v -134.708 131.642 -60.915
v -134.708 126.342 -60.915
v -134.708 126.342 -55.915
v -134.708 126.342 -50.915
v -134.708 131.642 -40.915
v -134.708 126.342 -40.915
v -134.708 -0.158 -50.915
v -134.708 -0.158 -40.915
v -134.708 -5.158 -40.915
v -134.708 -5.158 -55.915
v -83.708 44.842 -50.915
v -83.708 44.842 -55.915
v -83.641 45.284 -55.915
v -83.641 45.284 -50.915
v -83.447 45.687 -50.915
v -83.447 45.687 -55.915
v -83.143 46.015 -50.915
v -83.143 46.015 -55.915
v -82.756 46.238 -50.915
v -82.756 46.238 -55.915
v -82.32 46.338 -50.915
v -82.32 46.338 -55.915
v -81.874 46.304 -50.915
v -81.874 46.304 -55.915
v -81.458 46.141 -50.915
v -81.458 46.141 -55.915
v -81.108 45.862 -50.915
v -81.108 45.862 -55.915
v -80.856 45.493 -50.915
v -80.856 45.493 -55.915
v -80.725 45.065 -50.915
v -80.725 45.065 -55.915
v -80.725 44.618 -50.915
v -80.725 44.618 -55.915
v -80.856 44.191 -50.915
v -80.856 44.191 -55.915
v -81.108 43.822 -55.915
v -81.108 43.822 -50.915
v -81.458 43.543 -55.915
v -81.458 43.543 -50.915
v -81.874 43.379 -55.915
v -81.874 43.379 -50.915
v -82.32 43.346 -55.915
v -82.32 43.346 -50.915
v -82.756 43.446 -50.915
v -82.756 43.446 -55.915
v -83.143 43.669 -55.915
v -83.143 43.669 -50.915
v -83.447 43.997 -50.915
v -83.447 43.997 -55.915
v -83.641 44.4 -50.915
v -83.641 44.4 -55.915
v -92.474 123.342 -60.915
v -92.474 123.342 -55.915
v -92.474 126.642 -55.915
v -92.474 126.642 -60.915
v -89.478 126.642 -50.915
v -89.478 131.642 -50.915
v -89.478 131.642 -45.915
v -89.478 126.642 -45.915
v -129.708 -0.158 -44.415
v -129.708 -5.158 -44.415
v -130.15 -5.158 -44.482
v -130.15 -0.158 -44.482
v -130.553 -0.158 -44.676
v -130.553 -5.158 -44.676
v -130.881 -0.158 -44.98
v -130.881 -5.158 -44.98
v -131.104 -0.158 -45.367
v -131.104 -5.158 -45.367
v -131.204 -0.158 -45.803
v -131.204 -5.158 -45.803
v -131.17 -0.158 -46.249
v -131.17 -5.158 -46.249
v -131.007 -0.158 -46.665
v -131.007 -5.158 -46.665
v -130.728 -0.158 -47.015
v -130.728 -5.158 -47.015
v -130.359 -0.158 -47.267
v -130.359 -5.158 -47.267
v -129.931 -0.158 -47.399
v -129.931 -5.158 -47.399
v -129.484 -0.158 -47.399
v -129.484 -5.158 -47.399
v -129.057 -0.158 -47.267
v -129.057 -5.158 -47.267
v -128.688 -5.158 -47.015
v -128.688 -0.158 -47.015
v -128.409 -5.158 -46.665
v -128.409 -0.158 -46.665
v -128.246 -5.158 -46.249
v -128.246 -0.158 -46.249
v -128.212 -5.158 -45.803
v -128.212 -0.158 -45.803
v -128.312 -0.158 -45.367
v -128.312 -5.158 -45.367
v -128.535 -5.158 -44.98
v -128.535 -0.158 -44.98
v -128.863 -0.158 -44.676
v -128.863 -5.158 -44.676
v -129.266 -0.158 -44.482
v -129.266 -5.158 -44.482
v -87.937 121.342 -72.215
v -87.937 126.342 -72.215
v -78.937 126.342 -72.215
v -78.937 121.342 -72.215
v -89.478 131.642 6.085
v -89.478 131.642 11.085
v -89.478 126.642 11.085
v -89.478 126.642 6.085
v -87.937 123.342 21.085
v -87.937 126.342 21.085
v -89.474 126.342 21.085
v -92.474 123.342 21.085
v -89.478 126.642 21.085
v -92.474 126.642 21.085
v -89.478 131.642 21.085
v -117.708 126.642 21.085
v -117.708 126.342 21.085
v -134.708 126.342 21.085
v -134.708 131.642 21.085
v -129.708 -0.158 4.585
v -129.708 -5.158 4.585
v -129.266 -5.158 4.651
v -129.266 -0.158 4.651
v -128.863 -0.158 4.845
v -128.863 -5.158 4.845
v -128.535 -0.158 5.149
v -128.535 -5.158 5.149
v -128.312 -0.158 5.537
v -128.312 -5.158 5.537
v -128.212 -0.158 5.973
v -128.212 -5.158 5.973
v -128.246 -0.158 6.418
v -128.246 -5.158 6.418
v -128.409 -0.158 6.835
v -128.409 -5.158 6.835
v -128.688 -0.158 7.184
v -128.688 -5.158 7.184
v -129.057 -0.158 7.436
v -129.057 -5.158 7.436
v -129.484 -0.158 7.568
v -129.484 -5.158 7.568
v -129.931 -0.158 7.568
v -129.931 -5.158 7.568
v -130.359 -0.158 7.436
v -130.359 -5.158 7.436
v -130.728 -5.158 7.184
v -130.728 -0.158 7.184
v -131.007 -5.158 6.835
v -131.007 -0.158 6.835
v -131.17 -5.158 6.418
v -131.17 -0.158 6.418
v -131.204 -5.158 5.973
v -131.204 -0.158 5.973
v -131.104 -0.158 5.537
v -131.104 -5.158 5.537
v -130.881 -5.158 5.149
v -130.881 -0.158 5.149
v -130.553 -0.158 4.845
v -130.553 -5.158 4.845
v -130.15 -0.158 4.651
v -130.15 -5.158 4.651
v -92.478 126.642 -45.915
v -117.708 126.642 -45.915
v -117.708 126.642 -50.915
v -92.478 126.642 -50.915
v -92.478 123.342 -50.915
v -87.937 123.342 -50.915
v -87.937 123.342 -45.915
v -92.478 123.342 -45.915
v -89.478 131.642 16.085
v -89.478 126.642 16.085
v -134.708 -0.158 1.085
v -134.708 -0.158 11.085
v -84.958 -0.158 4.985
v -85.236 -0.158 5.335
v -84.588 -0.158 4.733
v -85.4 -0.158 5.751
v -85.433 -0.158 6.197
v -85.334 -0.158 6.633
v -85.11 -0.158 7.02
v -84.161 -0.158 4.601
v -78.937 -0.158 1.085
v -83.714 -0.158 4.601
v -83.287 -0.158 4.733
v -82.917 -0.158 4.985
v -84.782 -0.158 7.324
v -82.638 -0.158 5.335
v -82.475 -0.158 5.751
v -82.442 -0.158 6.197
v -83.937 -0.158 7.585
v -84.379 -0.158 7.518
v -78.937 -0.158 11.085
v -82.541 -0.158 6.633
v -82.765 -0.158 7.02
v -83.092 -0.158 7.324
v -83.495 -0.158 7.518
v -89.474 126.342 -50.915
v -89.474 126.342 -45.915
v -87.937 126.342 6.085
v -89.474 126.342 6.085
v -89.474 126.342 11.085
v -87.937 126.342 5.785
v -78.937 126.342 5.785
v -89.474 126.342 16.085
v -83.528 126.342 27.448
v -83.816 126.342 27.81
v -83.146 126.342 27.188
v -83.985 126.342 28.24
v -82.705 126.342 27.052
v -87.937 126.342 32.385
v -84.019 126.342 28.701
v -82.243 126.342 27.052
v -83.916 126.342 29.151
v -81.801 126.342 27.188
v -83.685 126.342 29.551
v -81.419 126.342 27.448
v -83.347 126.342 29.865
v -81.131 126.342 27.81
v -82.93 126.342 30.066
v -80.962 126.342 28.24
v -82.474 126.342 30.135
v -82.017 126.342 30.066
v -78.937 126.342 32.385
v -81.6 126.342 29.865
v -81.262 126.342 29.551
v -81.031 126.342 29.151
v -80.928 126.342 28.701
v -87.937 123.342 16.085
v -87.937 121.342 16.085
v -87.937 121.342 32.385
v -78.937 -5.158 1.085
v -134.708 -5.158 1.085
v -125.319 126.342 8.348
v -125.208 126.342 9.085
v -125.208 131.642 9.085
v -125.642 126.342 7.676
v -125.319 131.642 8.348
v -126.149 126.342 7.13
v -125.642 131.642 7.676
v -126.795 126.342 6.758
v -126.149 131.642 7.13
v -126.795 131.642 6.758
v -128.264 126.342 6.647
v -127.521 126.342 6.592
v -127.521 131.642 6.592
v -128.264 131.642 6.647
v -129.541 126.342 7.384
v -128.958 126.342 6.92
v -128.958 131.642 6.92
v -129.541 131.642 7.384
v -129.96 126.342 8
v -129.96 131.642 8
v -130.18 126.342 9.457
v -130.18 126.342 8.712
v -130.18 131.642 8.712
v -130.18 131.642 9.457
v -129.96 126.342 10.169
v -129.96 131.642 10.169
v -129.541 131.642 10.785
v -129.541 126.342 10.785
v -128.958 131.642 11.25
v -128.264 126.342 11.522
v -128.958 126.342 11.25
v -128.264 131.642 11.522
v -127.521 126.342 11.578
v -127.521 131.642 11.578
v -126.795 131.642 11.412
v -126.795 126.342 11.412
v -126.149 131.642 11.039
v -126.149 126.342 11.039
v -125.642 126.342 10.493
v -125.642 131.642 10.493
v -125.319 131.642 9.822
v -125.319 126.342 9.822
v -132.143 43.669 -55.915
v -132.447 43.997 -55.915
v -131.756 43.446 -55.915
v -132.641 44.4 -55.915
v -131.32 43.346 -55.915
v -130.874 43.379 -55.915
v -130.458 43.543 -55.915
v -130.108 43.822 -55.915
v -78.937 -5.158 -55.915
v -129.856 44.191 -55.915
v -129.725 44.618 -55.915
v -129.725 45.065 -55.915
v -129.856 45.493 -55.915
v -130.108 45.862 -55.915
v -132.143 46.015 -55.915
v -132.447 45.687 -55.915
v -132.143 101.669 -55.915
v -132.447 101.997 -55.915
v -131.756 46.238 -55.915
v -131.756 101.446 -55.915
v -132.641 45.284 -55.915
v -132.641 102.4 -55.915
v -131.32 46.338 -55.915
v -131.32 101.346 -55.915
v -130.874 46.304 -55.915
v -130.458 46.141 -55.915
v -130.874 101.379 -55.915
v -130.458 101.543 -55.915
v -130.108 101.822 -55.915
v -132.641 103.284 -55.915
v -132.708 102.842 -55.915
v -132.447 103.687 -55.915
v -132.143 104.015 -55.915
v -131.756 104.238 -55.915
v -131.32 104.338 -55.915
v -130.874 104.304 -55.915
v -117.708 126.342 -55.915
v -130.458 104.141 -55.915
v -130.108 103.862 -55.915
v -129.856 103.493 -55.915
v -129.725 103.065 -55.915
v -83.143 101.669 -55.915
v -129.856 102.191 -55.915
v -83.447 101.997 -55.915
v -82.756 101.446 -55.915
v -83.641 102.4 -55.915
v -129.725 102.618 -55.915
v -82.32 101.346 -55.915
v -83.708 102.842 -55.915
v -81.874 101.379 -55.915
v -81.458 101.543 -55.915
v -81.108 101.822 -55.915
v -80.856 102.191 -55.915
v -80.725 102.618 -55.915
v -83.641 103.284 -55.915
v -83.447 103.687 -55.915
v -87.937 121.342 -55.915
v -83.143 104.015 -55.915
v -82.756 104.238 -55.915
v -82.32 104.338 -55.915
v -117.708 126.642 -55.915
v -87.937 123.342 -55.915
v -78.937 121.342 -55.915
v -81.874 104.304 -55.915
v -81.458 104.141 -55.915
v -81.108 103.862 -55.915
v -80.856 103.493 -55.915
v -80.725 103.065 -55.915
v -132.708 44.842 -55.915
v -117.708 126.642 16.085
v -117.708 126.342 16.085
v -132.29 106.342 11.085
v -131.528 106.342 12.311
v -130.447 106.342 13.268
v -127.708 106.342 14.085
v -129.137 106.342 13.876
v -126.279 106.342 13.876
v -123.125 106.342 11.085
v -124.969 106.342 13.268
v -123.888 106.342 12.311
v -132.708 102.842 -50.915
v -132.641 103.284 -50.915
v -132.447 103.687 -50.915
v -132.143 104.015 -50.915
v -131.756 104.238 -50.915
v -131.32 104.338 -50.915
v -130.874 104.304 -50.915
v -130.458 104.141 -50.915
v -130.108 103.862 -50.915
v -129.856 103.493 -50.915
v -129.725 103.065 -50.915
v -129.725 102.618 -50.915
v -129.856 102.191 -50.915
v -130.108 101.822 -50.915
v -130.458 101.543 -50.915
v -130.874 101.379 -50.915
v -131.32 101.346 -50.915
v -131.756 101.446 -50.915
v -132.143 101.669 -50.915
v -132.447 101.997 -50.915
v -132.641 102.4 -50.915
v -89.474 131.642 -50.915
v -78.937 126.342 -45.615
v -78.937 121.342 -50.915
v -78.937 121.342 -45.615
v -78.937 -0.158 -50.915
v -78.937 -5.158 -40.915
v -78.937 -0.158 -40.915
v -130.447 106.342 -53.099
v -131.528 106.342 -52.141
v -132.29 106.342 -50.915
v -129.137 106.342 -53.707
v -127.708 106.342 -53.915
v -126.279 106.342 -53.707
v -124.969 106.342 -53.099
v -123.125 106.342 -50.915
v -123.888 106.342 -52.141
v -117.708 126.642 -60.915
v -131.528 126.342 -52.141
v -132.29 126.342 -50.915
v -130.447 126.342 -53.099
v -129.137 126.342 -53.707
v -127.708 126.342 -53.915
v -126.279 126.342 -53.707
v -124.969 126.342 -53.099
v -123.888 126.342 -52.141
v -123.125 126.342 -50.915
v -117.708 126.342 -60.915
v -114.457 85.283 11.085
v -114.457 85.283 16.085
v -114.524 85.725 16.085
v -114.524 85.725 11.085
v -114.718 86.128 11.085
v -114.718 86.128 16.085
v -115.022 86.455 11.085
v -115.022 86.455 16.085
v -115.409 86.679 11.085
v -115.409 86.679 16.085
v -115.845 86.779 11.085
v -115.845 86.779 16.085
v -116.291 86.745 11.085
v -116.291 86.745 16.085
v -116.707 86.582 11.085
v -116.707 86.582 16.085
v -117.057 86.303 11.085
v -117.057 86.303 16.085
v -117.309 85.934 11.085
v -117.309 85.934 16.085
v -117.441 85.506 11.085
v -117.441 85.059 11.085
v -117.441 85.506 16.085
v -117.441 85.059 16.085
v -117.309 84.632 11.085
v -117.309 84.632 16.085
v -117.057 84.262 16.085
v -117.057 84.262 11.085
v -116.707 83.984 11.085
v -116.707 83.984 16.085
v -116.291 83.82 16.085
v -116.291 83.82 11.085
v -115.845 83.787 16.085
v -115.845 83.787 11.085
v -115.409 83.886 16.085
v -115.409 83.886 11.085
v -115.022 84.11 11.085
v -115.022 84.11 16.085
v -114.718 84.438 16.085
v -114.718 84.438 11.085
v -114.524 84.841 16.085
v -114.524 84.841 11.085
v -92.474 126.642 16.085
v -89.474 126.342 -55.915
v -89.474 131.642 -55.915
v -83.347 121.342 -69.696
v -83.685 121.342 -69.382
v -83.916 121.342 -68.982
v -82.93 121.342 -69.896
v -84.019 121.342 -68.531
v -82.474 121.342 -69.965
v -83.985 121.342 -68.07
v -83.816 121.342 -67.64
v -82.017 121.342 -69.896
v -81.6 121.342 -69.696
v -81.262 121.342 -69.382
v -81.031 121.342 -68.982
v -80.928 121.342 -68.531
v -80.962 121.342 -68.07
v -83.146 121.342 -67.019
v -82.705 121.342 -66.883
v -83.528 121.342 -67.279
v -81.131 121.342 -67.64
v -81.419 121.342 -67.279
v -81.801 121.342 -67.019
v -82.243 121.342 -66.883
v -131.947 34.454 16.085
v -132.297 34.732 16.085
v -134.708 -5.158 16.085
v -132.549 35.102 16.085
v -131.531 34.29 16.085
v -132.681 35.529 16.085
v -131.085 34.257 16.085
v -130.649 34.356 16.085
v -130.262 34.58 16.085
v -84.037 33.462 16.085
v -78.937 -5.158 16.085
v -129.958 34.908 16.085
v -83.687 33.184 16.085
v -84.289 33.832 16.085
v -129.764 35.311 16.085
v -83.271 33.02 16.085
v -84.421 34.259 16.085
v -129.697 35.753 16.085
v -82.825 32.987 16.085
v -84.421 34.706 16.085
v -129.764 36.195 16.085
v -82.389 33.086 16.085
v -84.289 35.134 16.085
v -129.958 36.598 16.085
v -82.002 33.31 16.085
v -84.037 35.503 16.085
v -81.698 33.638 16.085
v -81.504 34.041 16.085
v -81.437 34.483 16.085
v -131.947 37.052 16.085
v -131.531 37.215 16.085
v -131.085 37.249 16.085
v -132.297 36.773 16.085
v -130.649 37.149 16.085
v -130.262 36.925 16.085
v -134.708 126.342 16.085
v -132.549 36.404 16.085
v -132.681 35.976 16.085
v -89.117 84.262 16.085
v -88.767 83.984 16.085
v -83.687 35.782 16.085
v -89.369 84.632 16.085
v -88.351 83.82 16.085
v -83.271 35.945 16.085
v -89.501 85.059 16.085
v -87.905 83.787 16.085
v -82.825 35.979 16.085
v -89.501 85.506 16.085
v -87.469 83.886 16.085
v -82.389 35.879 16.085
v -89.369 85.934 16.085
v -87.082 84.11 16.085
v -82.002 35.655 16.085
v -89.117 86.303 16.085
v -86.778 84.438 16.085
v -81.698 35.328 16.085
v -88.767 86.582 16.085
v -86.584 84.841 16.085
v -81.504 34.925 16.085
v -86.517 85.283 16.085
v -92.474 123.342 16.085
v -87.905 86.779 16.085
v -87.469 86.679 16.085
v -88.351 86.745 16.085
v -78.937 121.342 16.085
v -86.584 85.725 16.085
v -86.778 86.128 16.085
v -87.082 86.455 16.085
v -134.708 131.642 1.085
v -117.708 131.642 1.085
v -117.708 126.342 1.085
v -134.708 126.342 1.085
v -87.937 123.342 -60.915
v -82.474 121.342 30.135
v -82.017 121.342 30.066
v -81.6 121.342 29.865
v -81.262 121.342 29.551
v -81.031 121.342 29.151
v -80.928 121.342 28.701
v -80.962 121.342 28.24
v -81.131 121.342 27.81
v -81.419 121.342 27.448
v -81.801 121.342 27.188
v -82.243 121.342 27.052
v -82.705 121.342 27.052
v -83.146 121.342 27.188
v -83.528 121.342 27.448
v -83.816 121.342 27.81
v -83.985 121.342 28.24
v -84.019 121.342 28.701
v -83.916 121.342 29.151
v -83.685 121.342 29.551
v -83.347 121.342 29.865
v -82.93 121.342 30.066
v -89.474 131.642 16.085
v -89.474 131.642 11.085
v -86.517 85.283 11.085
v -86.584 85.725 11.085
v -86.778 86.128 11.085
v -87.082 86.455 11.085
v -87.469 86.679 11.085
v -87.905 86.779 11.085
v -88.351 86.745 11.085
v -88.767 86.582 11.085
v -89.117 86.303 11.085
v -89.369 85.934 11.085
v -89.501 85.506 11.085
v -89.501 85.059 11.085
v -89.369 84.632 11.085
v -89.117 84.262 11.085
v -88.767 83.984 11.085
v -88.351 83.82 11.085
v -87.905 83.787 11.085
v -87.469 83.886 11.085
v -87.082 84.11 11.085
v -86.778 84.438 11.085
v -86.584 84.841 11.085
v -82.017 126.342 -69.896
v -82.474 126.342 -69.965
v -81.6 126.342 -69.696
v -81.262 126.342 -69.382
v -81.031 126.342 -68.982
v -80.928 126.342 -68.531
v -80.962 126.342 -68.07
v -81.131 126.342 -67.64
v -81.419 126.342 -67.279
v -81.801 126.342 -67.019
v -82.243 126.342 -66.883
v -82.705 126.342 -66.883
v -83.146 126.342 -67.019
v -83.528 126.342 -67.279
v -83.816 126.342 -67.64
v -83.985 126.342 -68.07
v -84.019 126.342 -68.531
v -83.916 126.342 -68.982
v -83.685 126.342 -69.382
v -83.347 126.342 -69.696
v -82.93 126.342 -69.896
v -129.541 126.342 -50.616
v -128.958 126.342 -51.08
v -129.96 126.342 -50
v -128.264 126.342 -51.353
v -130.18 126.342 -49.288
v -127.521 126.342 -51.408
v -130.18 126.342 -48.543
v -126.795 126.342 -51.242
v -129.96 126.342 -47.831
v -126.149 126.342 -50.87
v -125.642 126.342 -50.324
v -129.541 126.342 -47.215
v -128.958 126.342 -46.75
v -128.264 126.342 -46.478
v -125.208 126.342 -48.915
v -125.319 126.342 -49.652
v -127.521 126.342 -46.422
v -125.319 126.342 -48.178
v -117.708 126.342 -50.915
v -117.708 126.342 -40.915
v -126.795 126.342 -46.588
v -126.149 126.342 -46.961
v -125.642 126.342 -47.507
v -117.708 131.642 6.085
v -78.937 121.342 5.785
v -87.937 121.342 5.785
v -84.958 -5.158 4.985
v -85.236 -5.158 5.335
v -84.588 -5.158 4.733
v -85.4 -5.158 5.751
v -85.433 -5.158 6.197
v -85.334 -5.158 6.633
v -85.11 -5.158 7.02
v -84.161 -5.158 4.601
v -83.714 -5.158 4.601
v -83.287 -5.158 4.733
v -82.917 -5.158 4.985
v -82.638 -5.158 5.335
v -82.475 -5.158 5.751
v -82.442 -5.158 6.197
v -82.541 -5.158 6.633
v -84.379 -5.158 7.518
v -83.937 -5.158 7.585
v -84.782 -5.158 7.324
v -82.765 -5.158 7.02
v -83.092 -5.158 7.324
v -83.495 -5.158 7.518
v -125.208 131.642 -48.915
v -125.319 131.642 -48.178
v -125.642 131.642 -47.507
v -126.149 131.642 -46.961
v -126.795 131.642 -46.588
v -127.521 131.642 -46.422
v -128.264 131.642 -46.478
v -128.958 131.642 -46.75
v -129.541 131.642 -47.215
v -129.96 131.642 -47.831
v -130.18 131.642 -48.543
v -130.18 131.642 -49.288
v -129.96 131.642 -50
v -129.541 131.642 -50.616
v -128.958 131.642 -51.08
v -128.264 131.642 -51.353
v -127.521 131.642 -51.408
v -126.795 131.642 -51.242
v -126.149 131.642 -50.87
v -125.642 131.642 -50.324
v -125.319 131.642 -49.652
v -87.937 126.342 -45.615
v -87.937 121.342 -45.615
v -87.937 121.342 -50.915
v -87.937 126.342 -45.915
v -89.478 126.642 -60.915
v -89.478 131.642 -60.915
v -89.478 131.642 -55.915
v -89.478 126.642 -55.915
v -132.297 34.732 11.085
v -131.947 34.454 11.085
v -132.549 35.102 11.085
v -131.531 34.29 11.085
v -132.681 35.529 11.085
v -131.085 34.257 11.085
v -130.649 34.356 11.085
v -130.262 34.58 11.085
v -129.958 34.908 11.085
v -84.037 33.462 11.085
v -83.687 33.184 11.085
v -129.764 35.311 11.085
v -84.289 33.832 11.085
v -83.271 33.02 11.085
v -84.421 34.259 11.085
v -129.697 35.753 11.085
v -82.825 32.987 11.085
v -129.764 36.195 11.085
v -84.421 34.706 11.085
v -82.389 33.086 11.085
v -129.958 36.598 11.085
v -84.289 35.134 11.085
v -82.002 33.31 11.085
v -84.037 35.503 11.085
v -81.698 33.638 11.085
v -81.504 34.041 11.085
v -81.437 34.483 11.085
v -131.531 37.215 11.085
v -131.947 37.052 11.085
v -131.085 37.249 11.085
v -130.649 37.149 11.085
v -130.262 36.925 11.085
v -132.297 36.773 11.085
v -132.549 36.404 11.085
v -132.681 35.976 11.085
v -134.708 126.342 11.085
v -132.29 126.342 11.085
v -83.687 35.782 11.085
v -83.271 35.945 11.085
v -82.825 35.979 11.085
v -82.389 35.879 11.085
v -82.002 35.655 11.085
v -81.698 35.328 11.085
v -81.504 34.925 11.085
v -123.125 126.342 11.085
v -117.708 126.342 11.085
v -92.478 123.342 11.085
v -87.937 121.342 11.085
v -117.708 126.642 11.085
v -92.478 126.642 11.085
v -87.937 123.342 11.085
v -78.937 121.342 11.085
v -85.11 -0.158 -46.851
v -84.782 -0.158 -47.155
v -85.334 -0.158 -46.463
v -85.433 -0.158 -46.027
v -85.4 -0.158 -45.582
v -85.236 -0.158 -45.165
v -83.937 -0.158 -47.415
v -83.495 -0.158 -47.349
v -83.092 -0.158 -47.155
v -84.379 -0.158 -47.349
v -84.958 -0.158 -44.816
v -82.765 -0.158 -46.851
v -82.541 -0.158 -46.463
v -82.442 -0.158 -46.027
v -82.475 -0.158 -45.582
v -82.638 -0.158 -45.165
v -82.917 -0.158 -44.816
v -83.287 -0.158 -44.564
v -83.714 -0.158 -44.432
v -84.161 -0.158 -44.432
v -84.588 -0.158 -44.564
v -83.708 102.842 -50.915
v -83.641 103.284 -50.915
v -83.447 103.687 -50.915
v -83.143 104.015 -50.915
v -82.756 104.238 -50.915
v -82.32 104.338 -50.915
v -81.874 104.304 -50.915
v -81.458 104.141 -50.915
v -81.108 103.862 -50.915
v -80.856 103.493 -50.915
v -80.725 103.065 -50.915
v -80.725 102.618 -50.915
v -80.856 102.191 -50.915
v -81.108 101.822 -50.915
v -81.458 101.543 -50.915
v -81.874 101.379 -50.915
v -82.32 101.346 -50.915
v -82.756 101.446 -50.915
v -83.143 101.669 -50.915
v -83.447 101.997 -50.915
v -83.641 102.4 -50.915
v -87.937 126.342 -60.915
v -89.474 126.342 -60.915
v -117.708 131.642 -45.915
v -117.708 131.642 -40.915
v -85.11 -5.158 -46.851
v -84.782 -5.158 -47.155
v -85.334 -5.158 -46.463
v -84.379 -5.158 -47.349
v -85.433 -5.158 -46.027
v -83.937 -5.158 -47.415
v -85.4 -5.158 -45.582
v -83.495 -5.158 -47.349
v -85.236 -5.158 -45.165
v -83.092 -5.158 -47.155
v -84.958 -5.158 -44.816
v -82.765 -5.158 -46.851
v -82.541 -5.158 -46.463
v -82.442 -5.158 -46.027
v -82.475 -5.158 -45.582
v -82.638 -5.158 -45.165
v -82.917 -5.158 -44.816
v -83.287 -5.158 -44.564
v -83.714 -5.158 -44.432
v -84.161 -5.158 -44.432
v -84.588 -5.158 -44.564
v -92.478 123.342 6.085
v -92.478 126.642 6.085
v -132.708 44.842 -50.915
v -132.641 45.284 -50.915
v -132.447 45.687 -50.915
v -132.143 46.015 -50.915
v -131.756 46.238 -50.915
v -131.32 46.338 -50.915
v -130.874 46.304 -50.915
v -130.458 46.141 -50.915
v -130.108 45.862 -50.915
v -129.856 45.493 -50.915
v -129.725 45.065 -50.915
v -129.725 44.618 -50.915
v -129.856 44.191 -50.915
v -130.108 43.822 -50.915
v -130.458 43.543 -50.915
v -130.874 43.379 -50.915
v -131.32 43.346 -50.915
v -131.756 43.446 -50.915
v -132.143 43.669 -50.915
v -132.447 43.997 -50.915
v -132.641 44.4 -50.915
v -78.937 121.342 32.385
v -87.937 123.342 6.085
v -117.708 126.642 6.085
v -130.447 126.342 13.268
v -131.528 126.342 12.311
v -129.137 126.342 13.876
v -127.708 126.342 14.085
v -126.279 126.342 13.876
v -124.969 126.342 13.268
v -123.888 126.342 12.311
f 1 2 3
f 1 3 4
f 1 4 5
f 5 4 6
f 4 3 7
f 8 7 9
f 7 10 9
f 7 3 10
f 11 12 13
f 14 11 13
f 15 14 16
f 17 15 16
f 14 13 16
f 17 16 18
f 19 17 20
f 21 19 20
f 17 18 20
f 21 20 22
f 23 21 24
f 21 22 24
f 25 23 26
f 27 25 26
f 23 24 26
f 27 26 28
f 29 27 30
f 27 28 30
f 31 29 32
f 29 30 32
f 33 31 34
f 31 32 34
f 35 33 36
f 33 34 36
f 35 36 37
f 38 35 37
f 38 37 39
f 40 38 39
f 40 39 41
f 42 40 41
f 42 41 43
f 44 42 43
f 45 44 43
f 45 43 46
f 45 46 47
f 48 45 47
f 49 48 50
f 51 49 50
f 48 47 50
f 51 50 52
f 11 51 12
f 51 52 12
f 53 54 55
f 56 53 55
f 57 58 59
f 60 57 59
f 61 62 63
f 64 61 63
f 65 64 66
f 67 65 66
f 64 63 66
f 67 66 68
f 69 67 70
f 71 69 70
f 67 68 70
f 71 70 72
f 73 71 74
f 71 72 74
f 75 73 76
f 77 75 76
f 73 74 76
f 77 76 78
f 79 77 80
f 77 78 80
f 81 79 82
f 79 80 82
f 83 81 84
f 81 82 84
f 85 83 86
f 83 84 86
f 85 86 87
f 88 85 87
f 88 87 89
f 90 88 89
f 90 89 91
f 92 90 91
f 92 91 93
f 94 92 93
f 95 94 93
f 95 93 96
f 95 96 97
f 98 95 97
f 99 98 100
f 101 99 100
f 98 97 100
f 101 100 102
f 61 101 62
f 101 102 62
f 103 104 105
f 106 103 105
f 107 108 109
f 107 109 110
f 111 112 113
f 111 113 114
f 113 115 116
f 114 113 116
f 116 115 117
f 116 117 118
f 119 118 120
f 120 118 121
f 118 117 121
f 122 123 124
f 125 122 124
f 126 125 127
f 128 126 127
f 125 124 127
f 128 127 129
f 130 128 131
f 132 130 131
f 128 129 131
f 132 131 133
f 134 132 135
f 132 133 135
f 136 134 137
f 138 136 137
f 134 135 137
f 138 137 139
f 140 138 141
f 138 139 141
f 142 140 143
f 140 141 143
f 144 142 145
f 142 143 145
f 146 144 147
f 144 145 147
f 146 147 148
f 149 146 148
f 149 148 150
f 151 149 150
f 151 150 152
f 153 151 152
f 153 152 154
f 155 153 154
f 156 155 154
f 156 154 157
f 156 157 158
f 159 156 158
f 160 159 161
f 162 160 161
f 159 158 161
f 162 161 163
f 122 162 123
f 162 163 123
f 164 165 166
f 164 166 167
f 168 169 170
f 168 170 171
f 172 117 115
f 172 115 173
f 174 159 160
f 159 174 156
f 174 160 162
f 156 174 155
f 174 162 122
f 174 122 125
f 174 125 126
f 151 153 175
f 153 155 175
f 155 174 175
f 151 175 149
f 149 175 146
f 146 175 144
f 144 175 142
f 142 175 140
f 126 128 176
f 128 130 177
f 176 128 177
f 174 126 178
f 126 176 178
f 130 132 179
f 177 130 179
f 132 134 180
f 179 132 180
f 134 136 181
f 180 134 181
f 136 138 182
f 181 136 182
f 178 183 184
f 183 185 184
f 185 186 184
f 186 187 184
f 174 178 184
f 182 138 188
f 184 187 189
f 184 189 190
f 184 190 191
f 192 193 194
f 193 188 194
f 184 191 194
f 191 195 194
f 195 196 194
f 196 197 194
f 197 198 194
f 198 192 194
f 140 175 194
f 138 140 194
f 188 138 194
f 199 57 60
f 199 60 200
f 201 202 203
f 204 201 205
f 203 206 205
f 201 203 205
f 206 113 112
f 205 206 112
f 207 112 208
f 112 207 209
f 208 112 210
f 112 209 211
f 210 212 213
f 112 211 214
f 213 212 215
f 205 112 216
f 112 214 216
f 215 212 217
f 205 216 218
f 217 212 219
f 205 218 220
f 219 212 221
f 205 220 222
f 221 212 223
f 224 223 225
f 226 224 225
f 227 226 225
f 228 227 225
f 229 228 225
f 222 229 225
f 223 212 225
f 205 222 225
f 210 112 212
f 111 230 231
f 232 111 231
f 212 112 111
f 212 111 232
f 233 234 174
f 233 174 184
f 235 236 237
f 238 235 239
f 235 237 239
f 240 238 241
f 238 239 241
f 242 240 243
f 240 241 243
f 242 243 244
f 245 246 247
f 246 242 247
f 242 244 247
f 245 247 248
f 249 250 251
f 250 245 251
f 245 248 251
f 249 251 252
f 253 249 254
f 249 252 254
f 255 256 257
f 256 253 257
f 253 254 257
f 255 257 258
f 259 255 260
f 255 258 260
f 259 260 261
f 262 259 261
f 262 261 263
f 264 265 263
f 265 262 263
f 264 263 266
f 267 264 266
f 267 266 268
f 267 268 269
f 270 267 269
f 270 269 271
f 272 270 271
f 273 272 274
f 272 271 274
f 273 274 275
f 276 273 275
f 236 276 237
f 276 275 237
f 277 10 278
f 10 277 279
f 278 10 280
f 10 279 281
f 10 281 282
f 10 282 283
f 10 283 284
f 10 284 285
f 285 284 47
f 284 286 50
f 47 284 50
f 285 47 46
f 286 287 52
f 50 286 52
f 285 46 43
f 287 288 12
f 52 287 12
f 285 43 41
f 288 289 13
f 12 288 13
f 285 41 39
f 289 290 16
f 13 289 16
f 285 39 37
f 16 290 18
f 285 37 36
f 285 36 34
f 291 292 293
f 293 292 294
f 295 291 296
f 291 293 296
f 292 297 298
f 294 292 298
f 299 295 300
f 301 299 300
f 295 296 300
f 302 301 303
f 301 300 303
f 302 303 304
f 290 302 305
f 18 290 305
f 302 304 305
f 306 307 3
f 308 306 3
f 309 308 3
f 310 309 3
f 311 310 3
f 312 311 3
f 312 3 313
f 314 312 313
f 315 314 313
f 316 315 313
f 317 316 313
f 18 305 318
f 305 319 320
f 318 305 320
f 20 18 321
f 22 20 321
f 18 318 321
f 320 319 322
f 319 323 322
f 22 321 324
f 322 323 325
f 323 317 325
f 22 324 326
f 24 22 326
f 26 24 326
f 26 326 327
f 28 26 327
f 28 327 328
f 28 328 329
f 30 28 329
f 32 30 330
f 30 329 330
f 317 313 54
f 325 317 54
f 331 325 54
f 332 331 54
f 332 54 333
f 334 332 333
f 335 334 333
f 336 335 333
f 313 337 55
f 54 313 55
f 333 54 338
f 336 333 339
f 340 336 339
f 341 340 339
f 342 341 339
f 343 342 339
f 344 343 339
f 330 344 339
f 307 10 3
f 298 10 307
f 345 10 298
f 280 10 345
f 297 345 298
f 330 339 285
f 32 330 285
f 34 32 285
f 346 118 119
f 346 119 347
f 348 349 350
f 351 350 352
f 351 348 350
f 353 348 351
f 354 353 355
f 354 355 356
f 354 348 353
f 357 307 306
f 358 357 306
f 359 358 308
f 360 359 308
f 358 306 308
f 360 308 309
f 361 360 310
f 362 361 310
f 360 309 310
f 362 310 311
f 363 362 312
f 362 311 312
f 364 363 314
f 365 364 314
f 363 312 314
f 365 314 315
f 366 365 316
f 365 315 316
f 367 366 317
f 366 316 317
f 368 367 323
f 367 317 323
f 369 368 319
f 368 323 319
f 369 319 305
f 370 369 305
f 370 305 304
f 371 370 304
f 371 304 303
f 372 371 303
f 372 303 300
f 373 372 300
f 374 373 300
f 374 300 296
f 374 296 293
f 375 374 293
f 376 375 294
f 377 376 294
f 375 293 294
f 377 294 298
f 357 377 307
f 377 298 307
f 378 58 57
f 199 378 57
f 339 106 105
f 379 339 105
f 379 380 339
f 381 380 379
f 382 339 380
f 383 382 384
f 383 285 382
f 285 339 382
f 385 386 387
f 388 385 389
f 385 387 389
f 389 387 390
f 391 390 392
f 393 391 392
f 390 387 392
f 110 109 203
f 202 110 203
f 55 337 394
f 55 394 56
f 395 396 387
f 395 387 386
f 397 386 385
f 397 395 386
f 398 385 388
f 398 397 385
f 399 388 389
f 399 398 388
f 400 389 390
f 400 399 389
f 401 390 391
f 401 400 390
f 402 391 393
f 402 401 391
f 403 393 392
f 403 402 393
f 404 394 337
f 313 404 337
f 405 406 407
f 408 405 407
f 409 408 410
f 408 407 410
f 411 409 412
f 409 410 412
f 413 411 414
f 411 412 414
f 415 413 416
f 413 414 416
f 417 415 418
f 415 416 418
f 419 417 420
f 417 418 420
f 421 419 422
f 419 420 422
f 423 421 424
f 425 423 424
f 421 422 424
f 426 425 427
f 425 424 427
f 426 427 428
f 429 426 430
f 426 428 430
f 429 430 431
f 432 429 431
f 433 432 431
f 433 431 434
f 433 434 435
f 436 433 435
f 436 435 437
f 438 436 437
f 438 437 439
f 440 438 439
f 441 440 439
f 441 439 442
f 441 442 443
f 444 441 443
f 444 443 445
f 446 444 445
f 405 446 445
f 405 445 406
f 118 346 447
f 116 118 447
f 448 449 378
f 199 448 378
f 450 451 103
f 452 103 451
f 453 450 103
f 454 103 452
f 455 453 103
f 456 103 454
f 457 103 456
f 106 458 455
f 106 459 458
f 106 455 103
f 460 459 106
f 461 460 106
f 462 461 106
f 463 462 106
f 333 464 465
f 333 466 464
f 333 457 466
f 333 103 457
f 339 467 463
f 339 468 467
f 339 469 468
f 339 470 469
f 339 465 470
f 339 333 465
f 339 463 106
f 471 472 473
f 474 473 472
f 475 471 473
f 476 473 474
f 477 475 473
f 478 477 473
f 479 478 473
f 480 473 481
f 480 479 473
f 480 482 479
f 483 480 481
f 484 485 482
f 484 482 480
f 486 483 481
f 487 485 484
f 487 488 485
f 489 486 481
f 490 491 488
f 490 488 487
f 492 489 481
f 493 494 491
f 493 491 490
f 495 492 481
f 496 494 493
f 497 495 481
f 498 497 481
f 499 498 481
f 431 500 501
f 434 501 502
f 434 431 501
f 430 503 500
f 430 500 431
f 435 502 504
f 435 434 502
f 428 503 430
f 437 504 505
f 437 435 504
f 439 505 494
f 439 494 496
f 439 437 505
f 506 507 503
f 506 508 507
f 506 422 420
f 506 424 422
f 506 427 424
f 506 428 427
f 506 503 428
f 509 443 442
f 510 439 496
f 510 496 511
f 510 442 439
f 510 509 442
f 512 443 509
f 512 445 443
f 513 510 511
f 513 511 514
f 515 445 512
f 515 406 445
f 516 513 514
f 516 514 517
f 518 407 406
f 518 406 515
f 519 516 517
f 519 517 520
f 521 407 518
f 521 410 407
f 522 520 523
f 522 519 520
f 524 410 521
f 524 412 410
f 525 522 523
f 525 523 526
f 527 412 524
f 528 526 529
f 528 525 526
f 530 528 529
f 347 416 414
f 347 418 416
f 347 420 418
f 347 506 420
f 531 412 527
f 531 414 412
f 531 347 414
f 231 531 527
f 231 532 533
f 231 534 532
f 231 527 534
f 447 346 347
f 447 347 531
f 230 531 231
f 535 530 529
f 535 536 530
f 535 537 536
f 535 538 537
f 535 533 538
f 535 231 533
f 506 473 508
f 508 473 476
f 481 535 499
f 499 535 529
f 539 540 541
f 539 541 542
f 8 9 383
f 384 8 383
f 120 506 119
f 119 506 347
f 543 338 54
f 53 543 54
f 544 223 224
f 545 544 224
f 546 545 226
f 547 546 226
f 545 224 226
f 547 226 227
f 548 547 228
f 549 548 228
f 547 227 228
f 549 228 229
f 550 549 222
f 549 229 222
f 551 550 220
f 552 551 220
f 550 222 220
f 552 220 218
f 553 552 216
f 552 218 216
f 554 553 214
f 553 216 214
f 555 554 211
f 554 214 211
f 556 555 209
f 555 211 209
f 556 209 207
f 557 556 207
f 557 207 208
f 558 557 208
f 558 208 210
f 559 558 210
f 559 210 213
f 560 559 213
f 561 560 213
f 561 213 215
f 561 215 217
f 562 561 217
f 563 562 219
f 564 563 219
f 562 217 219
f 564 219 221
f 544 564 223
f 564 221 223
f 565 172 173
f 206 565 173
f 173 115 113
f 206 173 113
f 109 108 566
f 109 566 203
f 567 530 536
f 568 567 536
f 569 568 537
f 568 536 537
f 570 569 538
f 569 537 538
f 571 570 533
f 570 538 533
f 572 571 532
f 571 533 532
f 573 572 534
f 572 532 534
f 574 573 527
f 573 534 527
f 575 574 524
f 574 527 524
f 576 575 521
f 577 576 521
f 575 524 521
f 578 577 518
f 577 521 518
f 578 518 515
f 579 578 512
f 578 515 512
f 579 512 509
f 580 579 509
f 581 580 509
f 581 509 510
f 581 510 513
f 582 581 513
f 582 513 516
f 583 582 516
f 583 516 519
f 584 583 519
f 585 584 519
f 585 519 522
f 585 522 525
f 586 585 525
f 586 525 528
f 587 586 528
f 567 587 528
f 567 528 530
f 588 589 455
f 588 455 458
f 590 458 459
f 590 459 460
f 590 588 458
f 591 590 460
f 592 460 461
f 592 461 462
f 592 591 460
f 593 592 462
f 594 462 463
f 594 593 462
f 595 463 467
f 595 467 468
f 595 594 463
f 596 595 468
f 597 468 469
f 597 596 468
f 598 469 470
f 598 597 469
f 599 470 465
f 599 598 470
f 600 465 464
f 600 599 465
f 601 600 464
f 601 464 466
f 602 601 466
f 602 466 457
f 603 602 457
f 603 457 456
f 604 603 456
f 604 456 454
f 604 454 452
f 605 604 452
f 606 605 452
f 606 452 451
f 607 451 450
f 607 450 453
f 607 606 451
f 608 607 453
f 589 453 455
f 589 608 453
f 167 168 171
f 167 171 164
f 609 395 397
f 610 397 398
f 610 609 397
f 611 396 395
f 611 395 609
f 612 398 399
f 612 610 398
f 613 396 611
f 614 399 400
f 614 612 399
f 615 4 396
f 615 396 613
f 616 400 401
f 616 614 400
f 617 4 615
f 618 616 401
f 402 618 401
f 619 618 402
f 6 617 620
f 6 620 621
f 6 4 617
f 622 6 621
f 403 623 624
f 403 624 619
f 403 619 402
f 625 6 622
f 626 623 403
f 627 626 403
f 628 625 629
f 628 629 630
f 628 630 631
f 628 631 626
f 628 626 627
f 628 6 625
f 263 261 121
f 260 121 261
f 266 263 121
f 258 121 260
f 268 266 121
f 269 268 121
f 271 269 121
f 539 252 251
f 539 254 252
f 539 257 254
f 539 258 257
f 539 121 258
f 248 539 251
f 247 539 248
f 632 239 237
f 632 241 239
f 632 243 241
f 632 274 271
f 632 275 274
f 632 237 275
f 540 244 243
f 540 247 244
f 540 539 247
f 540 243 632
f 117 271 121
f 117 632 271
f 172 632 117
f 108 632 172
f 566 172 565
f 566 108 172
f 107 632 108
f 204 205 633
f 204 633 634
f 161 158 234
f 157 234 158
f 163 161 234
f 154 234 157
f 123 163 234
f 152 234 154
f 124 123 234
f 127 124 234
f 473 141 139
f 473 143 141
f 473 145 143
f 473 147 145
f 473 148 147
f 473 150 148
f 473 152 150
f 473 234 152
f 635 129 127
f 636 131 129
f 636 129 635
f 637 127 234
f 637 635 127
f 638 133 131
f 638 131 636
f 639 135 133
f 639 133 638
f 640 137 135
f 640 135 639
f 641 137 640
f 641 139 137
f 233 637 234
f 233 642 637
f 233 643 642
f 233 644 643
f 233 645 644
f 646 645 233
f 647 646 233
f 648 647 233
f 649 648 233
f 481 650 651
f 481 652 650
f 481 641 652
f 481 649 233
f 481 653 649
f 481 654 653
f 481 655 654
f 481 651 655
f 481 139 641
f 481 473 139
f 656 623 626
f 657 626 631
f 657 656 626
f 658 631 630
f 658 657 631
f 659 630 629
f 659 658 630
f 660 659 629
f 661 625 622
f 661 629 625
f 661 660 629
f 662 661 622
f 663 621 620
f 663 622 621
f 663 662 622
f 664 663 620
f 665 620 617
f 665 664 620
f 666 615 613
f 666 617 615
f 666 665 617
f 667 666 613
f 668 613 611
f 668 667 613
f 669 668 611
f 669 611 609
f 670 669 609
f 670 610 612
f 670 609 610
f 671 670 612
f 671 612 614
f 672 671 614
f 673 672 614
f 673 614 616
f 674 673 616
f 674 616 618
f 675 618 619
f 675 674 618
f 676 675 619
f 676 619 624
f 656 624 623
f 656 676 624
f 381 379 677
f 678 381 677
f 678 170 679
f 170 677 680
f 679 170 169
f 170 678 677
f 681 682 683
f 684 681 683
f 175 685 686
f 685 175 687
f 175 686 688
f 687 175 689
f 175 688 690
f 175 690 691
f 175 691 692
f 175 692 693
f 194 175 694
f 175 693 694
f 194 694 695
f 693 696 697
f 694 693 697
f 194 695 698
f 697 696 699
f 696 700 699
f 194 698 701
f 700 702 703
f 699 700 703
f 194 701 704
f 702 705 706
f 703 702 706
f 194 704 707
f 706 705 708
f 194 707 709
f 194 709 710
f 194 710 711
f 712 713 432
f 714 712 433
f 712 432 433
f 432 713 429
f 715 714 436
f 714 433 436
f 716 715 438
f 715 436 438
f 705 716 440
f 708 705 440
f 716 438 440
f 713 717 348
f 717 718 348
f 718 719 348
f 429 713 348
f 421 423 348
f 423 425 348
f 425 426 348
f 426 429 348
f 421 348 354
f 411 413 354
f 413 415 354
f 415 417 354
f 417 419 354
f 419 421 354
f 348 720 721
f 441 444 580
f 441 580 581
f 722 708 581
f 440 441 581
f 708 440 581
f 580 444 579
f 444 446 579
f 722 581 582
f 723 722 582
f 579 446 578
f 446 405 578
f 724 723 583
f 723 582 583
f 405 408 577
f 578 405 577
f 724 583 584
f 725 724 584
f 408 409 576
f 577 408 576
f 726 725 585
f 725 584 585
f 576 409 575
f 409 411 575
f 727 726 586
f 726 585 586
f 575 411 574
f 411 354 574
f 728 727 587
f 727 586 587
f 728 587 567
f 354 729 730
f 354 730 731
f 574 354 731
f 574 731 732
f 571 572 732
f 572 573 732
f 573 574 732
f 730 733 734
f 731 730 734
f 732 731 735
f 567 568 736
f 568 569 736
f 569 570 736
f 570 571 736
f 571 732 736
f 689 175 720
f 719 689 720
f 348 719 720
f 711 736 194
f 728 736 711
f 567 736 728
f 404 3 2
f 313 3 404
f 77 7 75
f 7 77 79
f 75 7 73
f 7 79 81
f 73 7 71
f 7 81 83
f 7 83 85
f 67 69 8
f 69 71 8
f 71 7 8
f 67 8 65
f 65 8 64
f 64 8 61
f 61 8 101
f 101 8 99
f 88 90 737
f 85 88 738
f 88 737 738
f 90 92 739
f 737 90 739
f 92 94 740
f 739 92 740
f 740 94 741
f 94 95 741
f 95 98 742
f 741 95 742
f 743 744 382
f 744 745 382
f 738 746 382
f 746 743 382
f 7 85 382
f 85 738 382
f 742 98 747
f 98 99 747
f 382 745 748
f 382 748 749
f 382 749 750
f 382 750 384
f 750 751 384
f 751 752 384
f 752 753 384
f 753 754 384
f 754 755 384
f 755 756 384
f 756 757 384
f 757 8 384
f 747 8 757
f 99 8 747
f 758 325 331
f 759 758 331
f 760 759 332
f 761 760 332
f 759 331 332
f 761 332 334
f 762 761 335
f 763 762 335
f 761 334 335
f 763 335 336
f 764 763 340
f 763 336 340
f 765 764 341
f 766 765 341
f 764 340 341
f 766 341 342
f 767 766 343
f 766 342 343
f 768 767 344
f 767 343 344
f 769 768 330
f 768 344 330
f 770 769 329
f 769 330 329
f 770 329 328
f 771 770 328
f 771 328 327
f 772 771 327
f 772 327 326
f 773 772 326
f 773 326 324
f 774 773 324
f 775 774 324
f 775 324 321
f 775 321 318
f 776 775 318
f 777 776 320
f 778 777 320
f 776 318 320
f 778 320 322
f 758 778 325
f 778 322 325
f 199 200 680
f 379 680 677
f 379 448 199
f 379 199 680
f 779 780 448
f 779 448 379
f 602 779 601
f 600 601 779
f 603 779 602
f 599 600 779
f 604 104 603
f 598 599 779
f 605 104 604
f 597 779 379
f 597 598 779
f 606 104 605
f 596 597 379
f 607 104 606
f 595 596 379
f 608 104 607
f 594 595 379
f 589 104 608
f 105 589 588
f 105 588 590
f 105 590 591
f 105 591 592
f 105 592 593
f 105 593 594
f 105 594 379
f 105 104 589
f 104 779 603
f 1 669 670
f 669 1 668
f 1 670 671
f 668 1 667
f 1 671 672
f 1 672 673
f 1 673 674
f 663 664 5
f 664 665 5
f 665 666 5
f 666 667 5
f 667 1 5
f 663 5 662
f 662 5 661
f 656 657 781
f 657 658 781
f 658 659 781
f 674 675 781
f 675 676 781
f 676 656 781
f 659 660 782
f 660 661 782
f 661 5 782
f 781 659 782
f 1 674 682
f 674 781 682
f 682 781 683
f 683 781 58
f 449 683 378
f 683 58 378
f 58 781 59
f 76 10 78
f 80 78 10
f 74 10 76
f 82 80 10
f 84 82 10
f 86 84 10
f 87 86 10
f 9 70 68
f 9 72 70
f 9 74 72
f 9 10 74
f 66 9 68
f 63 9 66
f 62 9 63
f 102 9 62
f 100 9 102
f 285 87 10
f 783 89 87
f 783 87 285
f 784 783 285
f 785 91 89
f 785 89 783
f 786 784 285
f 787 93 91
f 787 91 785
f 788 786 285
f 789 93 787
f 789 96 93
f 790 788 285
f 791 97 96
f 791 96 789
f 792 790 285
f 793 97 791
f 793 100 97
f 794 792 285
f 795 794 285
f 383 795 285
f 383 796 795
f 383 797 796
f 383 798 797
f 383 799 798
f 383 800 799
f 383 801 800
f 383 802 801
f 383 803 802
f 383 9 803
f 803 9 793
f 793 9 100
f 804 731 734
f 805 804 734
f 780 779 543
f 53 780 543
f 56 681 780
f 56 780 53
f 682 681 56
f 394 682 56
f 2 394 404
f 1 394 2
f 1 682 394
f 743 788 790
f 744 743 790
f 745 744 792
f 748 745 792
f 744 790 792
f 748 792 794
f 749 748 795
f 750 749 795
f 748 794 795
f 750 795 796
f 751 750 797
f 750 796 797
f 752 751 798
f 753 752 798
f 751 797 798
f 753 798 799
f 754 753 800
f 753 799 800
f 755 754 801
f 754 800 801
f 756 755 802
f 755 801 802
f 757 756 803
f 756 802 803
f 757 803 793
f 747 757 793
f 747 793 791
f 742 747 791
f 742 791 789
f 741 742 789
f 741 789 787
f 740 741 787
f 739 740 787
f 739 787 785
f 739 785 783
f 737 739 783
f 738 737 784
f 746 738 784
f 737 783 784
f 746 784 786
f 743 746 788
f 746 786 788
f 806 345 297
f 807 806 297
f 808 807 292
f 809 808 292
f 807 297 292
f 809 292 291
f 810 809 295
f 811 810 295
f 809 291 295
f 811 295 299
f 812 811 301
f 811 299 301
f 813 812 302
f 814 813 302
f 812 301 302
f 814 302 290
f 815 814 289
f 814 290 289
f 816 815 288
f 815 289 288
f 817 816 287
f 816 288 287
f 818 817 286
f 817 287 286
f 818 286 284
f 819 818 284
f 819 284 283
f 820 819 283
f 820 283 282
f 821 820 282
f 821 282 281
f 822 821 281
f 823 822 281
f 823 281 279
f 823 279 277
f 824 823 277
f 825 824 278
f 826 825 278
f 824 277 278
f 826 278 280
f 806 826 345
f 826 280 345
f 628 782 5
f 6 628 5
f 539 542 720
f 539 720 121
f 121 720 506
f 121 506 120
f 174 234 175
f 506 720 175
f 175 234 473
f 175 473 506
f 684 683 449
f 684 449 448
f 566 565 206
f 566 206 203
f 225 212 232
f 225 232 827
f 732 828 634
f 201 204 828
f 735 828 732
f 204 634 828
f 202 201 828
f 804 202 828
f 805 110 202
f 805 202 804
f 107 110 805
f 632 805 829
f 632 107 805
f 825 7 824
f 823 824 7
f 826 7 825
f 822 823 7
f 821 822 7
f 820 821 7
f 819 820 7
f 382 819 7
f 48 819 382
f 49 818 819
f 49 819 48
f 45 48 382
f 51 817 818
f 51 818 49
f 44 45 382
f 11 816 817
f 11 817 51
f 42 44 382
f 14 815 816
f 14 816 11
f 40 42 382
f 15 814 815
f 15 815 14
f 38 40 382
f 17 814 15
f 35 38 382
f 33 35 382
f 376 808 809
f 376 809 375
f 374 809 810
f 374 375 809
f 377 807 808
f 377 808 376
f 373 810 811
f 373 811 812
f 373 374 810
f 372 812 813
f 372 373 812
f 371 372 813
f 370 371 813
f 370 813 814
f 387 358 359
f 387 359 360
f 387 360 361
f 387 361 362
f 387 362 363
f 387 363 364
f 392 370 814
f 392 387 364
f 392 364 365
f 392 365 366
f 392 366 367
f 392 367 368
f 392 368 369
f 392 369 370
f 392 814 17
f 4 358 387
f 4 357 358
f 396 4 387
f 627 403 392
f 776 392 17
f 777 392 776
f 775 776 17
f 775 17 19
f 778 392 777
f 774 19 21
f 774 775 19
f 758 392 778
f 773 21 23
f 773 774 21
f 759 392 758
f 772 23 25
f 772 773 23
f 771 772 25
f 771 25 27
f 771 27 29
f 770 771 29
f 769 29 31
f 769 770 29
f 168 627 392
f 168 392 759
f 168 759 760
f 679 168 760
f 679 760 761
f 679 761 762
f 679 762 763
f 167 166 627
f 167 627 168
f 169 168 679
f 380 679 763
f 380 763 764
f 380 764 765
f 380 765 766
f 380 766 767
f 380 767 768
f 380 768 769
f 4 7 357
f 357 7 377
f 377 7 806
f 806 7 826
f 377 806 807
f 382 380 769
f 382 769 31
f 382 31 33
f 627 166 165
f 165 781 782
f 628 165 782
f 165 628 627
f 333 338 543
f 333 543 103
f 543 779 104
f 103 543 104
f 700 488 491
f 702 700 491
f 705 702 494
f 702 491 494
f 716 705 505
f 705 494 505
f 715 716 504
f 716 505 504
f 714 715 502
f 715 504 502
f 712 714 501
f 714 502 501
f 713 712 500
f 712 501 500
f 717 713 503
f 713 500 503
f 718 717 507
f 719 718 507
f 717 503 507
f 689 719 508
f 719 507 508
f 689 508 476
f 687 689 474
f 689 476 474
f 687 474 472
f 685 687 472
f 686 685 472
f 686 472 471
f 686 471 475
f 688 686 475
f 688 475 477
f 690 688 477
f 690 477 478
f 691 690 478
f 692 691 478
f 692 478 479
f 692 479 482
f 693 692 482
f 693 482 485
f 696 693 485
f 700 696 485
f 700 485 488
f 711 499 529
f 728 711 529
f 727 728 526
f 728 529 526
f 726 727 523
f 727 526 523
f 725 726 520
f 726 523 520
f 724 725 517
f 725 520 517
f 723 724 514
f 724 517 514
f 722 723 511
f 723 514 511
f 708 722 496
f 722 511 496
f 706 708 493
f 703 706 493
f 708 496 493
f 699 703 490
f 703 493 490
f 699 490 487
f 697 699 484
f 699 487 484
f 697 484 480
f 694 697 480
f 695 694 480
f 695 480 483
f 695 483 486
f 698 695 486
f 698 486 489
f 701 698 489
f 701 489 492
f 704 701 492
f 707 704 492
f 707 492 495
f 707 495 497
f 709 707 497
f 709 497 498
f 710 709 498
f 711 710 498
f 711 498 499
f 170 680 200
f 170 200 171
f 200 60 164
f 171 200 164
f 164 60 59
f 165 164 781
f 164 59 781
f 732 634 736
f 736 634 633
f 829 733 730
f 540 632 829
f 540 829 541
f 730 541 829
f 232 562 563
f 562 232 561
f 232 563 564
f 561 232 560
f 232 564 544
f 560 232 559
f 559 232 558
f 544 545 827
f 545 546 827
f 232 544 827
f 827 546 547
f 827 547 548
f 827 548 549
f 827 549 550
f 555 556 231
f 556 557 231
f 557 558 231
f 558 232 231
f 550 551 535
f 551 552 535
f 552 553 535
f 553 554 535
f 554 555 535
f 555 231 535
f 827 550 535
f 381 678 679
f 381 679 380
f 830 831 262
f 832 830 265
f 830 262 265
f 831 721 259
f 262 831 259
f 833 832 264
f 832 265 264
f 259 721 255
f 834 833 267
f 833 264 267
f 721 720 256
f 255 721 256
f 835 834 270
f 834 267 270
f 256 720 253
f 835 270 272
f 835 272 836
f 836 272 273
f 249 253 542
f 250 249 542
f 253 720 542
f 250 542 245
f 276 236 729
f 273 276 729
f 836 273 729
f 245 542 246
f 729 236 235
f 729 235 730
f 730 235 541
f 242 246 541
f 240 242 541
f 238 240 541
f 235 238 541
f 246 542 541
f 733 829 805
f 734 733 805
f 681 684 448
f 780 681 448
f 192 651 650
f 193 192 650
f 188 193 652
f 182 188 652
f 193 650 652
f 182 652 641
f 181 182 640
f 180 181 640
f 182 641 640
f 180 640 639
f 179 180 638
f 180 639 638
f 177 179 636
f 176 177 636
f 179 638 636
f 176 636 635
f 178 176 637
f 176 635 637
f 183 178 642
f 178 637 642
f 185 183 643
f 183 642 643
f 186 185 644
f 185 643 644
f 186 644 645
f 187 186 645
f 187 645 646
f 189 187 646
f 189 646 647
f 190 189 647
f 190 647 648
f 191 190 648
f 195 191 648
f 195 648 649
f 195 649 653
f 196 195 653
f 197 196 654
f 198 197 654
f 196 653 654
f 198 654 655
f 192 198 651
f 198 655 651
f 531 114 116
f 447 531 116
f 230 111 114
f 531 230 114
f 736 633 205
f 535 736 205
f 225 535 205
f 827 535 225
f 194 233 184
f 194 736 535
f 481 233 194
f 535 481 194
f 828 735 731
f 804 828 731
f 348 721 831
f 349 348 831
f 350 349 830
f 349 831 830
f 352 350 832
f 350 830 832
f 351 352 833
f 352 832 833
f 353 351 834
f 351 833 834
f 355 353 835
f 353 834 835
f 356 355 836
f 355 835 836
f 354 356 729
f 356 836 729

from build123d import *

# Parameters (mm, degrees)
EXTRUDE_1_OUTLINE_R = 2.5
EXTRUDE_1_DEPTH     = 5.3
SKETCH_2_R          = 1.55
EXTRUDE_2_DEPTH     = 5
SKETCH_3_W          = 55.770566096
SKETCH_3_H          = 5
EXTRUDE_3_DEPTH     = 126.5
SKETCH_4_R          = 5
CUT_EXTRUDE_1_DEPTH = 20
SKETCH_5_W          = 28.229480684
SKETCH_5_H          = 5
EXTRUDE_4_DEPTH     = 5
EXTRUDE_5_DEPTH     = 5
EXTRUDE_6_DEPTH     = 5
SKETCH_8_W          = 55.770566096
SKETCH_8_H          = 10
SKETCH_8_R          = 1.5
EXTRUDE_7_DEPTH     = 5
SKETCH_9_R          = 1.5
CUT_EXTRUDE_2_DEPTH = 5
SKETCH_10_R         = 1.5
CUT_EXTRUDE_3_DEPTH = 10


# Read off the part's stored shape, not the designer's step: 填料-伸長1
with BuildPart() as part:
    # 填料-伸長1 outline → 填料-伸長1 (new body)
    with BuildSketch(Plane.XZ.offset(-131.641882403)):
        Polygon((-134.707905988, -40.915289206), (-134.707905988, -60.915289206), (-117.707905988, -60.915289206), (-117.707905988, -55.915289206), (-89.473538161, -55.915289206), (-89.473538161, -50.915289206), (-117.707905988, -50.915289206), (-117.707905988, -40.915289206), align=None)
        with Locations((-127.707905988, -48.915289206)):
            Circle(EXTRUDE_1_OUTLINE_R, mode=Mode.SUBTRACT)
    extrude(amount=EXTRUDE_1_DEPTH)

    # 草圖2 → 填料-伸長2 (add)
    with BuildSketch(Plane.XZ.offset(-126.341882403)):
        Polygon((-122.707905988, -50.915289206), (-134.707905988, -50.915289206), (-134.707905988, -55.915289206), (-117.707905988, -55.915289206), (-89.473538161, -55.915289206), (-87.937339892, -55.915289206), (-87.937339892, -72.215289206), (-85.473538161, -72.215289206), (-78.937339892, -72.215289206), (-78.937339892, -55.915289206), (-78.937339892, -50.915289206), (-78.937339892, -45.615289206), (-87.937339892, -45.615289206), (-87.937339892, -50.915289206), (-89.473538161, -50.915289206), (-117.707905988, -50.915289206), align=None)
        with Locations(Location((-82.473538161, -68.415289206, 0), (0, 0, 270))):
            Circle(SKETCH_2_R, mode=Mode.SUBTRACT)
    extrude(amount=EXTRUDE_2_DEPTH)

    # 草圖3 → 填料-伸長3 (add)
    with BuildSketch(Plane.XZ.offset(-121.341882403)):
        with Locations((-106.82262294, -53.415289206)):
            Rectangle(SKETCH_3_W, SKETCH_3_H)
    extrude(amount=EXTRUDE_3_DEPTH)

    # 草圖4 → 除料-伸長1 (cut)
    with BuildSketch(Plane.XZ.offset(-126.341882403)):
        with Locations((-127.707905988, -48.915289206)):
            Circle(SKETCH_4_R)
    extrude(amount=CUT_EXTRUDE_1_DEPTH, mode=Mode.SUBTRACT)

    # 草圖5 → 填料-伸長4 (add)
    with BuildSketch(Plane.XZ.offset(-131.641882403)):
        with Locations((-103.593165646, -58.415289206)):
            Rectangle(SKETCH_5_W, SKETCH_5_H)
        with Locations((-103.593165646, -48.415289206)):
            Rectangle(SKETCH_5_W, SKETCH_5_H)
    extrude(amount=EXTRUDE_4_DEPTH)

    # 草圖6 → 填料-伸長5 (add)
    with BuildSketch(Plane(origin=(0, 0, -55.915289206), x_dir=(-1, 0, 0), z_dir=(0, 0, -1))):
        Polygon((89.478425304, 126.641882403), (89.473538161, 126.341882403), (87.937339892, 126.341882403), (87.937339892, 123.341882403), (92.473538161, 123.341882403), (92.473538161, 126.641882403), align=None)
    extrude(amount=EXTRUDE_5_DEPTH)

    # 草圖7 → 填料-伸長6 (add)
    with BuildSketch(Plane.XY.offset(-50.915289206)):
        Polygon((-89.478425304, 126.641882403), (-89.473538161, 126.341882403), (-87.937339892, 126.341882403), (-87.937339892, 123.341882403), (-92.478425304, 123.341882403), (-92.478425304, 126.641882403), align=None)
    extrude(amount=EXTRUDE_6_DEPTH)


with BuildPart() as body_2:
    # 鏡射12: mirrored copy
    add(part.part.mirror(Plane.XY.offset(-19.915289206)))


with BuildPart() as part_1:
    add(part.part)

    add(body_2.part)  # 填料-伸長7 merges body 2
    # 草圖8 → 填料-伸長7 (add)
    # profile 1 of 2: a face of its own
    with BuildSketch(Plane.XZ.offset(5.158117597)):
        with Locations((-106.82262294, 6.084710794)):
            Rectangle(SKETCH_8_W, SKETCH_8_H)
        with Locations(Location((-129.707905988, 6.084710794, 0), (0, 0, 270))):
            Circle(SKETCH_8_R, mode=Mode.SUBTRACT)
        with Locations(Location((-83.937339892, 6.084710794, 0), (0, 0, 90))):
            Circle(SKETCH_8_R, mode=Mode.SUBTRACT)
    # profile 2 of 2: a face of its own
    with BuildSketch(Plane.XZ.offset(5.158117597)):
        with Locations((-106.82262294, -45.915289206)):
            Rectangle(SKETCH_8_W, SKETCH_8_H)
        with Locations(Location((-129.707905988, -45.915289206, 0), (0, 0, 90))):
            Circle(SKETCH_8_R, mode=Mode.SUBTRACT)
        with Locations(Location((-83.937339892, -45.915289206, 0), (0, 0, 270))):
            Circle(SKETCH_8_R, mode=Mode.SUBTRACT)
    extrude(amount=-EXTRUDE_7_DEPTH)

    # 草圖9 → 除料-伸長2 (cut)
    with BuildSketch(Plane(origin=(0, 0, -55.915289206), x_dir=(-1, 0, 0), z_dir=(0, 0, -1))):
        with Locations((131.207905988, 44.841882403)):
            Circle(SKETCH_9_R)
        with Locations((131.207905988, 102.841882403)):
            Circle(SKETCH_9_R)
        with Locations((82.207905988, 102.841882403)):
            Circle(SKETCH_9_R)
        with Locations((82.207905988, 44.841882403)):
            Circle(SKETCH_9_R)
    extrude(amount=-CUT_EXTRUDE_2_DEPTH, mode=Mode.SUBTRACT)

    # 草圖10 → 除料-伸長3 (cut)
    with BuildSketch(Plane.XY.offset(16.084710794)):
        with Locations((-88.017339892, 85.282727934)):
            Circle(SKETCH_10_R)
        with Locations((-115.957339892, 85.282727934)):
            Circle(SKETCH_10_R)
        with Locations((-131.197339892, 35.752727934)):
            Circle(SKETCH_10_R)
        with Locations((-82.937339892, 34.482727934)):
            Circle(SKETCH_10_R)
    extrude(amount=-CUT_EXTRUDE_3_DEPTH, mode=Mode.SUBTRACT)


solid = part_1.part
